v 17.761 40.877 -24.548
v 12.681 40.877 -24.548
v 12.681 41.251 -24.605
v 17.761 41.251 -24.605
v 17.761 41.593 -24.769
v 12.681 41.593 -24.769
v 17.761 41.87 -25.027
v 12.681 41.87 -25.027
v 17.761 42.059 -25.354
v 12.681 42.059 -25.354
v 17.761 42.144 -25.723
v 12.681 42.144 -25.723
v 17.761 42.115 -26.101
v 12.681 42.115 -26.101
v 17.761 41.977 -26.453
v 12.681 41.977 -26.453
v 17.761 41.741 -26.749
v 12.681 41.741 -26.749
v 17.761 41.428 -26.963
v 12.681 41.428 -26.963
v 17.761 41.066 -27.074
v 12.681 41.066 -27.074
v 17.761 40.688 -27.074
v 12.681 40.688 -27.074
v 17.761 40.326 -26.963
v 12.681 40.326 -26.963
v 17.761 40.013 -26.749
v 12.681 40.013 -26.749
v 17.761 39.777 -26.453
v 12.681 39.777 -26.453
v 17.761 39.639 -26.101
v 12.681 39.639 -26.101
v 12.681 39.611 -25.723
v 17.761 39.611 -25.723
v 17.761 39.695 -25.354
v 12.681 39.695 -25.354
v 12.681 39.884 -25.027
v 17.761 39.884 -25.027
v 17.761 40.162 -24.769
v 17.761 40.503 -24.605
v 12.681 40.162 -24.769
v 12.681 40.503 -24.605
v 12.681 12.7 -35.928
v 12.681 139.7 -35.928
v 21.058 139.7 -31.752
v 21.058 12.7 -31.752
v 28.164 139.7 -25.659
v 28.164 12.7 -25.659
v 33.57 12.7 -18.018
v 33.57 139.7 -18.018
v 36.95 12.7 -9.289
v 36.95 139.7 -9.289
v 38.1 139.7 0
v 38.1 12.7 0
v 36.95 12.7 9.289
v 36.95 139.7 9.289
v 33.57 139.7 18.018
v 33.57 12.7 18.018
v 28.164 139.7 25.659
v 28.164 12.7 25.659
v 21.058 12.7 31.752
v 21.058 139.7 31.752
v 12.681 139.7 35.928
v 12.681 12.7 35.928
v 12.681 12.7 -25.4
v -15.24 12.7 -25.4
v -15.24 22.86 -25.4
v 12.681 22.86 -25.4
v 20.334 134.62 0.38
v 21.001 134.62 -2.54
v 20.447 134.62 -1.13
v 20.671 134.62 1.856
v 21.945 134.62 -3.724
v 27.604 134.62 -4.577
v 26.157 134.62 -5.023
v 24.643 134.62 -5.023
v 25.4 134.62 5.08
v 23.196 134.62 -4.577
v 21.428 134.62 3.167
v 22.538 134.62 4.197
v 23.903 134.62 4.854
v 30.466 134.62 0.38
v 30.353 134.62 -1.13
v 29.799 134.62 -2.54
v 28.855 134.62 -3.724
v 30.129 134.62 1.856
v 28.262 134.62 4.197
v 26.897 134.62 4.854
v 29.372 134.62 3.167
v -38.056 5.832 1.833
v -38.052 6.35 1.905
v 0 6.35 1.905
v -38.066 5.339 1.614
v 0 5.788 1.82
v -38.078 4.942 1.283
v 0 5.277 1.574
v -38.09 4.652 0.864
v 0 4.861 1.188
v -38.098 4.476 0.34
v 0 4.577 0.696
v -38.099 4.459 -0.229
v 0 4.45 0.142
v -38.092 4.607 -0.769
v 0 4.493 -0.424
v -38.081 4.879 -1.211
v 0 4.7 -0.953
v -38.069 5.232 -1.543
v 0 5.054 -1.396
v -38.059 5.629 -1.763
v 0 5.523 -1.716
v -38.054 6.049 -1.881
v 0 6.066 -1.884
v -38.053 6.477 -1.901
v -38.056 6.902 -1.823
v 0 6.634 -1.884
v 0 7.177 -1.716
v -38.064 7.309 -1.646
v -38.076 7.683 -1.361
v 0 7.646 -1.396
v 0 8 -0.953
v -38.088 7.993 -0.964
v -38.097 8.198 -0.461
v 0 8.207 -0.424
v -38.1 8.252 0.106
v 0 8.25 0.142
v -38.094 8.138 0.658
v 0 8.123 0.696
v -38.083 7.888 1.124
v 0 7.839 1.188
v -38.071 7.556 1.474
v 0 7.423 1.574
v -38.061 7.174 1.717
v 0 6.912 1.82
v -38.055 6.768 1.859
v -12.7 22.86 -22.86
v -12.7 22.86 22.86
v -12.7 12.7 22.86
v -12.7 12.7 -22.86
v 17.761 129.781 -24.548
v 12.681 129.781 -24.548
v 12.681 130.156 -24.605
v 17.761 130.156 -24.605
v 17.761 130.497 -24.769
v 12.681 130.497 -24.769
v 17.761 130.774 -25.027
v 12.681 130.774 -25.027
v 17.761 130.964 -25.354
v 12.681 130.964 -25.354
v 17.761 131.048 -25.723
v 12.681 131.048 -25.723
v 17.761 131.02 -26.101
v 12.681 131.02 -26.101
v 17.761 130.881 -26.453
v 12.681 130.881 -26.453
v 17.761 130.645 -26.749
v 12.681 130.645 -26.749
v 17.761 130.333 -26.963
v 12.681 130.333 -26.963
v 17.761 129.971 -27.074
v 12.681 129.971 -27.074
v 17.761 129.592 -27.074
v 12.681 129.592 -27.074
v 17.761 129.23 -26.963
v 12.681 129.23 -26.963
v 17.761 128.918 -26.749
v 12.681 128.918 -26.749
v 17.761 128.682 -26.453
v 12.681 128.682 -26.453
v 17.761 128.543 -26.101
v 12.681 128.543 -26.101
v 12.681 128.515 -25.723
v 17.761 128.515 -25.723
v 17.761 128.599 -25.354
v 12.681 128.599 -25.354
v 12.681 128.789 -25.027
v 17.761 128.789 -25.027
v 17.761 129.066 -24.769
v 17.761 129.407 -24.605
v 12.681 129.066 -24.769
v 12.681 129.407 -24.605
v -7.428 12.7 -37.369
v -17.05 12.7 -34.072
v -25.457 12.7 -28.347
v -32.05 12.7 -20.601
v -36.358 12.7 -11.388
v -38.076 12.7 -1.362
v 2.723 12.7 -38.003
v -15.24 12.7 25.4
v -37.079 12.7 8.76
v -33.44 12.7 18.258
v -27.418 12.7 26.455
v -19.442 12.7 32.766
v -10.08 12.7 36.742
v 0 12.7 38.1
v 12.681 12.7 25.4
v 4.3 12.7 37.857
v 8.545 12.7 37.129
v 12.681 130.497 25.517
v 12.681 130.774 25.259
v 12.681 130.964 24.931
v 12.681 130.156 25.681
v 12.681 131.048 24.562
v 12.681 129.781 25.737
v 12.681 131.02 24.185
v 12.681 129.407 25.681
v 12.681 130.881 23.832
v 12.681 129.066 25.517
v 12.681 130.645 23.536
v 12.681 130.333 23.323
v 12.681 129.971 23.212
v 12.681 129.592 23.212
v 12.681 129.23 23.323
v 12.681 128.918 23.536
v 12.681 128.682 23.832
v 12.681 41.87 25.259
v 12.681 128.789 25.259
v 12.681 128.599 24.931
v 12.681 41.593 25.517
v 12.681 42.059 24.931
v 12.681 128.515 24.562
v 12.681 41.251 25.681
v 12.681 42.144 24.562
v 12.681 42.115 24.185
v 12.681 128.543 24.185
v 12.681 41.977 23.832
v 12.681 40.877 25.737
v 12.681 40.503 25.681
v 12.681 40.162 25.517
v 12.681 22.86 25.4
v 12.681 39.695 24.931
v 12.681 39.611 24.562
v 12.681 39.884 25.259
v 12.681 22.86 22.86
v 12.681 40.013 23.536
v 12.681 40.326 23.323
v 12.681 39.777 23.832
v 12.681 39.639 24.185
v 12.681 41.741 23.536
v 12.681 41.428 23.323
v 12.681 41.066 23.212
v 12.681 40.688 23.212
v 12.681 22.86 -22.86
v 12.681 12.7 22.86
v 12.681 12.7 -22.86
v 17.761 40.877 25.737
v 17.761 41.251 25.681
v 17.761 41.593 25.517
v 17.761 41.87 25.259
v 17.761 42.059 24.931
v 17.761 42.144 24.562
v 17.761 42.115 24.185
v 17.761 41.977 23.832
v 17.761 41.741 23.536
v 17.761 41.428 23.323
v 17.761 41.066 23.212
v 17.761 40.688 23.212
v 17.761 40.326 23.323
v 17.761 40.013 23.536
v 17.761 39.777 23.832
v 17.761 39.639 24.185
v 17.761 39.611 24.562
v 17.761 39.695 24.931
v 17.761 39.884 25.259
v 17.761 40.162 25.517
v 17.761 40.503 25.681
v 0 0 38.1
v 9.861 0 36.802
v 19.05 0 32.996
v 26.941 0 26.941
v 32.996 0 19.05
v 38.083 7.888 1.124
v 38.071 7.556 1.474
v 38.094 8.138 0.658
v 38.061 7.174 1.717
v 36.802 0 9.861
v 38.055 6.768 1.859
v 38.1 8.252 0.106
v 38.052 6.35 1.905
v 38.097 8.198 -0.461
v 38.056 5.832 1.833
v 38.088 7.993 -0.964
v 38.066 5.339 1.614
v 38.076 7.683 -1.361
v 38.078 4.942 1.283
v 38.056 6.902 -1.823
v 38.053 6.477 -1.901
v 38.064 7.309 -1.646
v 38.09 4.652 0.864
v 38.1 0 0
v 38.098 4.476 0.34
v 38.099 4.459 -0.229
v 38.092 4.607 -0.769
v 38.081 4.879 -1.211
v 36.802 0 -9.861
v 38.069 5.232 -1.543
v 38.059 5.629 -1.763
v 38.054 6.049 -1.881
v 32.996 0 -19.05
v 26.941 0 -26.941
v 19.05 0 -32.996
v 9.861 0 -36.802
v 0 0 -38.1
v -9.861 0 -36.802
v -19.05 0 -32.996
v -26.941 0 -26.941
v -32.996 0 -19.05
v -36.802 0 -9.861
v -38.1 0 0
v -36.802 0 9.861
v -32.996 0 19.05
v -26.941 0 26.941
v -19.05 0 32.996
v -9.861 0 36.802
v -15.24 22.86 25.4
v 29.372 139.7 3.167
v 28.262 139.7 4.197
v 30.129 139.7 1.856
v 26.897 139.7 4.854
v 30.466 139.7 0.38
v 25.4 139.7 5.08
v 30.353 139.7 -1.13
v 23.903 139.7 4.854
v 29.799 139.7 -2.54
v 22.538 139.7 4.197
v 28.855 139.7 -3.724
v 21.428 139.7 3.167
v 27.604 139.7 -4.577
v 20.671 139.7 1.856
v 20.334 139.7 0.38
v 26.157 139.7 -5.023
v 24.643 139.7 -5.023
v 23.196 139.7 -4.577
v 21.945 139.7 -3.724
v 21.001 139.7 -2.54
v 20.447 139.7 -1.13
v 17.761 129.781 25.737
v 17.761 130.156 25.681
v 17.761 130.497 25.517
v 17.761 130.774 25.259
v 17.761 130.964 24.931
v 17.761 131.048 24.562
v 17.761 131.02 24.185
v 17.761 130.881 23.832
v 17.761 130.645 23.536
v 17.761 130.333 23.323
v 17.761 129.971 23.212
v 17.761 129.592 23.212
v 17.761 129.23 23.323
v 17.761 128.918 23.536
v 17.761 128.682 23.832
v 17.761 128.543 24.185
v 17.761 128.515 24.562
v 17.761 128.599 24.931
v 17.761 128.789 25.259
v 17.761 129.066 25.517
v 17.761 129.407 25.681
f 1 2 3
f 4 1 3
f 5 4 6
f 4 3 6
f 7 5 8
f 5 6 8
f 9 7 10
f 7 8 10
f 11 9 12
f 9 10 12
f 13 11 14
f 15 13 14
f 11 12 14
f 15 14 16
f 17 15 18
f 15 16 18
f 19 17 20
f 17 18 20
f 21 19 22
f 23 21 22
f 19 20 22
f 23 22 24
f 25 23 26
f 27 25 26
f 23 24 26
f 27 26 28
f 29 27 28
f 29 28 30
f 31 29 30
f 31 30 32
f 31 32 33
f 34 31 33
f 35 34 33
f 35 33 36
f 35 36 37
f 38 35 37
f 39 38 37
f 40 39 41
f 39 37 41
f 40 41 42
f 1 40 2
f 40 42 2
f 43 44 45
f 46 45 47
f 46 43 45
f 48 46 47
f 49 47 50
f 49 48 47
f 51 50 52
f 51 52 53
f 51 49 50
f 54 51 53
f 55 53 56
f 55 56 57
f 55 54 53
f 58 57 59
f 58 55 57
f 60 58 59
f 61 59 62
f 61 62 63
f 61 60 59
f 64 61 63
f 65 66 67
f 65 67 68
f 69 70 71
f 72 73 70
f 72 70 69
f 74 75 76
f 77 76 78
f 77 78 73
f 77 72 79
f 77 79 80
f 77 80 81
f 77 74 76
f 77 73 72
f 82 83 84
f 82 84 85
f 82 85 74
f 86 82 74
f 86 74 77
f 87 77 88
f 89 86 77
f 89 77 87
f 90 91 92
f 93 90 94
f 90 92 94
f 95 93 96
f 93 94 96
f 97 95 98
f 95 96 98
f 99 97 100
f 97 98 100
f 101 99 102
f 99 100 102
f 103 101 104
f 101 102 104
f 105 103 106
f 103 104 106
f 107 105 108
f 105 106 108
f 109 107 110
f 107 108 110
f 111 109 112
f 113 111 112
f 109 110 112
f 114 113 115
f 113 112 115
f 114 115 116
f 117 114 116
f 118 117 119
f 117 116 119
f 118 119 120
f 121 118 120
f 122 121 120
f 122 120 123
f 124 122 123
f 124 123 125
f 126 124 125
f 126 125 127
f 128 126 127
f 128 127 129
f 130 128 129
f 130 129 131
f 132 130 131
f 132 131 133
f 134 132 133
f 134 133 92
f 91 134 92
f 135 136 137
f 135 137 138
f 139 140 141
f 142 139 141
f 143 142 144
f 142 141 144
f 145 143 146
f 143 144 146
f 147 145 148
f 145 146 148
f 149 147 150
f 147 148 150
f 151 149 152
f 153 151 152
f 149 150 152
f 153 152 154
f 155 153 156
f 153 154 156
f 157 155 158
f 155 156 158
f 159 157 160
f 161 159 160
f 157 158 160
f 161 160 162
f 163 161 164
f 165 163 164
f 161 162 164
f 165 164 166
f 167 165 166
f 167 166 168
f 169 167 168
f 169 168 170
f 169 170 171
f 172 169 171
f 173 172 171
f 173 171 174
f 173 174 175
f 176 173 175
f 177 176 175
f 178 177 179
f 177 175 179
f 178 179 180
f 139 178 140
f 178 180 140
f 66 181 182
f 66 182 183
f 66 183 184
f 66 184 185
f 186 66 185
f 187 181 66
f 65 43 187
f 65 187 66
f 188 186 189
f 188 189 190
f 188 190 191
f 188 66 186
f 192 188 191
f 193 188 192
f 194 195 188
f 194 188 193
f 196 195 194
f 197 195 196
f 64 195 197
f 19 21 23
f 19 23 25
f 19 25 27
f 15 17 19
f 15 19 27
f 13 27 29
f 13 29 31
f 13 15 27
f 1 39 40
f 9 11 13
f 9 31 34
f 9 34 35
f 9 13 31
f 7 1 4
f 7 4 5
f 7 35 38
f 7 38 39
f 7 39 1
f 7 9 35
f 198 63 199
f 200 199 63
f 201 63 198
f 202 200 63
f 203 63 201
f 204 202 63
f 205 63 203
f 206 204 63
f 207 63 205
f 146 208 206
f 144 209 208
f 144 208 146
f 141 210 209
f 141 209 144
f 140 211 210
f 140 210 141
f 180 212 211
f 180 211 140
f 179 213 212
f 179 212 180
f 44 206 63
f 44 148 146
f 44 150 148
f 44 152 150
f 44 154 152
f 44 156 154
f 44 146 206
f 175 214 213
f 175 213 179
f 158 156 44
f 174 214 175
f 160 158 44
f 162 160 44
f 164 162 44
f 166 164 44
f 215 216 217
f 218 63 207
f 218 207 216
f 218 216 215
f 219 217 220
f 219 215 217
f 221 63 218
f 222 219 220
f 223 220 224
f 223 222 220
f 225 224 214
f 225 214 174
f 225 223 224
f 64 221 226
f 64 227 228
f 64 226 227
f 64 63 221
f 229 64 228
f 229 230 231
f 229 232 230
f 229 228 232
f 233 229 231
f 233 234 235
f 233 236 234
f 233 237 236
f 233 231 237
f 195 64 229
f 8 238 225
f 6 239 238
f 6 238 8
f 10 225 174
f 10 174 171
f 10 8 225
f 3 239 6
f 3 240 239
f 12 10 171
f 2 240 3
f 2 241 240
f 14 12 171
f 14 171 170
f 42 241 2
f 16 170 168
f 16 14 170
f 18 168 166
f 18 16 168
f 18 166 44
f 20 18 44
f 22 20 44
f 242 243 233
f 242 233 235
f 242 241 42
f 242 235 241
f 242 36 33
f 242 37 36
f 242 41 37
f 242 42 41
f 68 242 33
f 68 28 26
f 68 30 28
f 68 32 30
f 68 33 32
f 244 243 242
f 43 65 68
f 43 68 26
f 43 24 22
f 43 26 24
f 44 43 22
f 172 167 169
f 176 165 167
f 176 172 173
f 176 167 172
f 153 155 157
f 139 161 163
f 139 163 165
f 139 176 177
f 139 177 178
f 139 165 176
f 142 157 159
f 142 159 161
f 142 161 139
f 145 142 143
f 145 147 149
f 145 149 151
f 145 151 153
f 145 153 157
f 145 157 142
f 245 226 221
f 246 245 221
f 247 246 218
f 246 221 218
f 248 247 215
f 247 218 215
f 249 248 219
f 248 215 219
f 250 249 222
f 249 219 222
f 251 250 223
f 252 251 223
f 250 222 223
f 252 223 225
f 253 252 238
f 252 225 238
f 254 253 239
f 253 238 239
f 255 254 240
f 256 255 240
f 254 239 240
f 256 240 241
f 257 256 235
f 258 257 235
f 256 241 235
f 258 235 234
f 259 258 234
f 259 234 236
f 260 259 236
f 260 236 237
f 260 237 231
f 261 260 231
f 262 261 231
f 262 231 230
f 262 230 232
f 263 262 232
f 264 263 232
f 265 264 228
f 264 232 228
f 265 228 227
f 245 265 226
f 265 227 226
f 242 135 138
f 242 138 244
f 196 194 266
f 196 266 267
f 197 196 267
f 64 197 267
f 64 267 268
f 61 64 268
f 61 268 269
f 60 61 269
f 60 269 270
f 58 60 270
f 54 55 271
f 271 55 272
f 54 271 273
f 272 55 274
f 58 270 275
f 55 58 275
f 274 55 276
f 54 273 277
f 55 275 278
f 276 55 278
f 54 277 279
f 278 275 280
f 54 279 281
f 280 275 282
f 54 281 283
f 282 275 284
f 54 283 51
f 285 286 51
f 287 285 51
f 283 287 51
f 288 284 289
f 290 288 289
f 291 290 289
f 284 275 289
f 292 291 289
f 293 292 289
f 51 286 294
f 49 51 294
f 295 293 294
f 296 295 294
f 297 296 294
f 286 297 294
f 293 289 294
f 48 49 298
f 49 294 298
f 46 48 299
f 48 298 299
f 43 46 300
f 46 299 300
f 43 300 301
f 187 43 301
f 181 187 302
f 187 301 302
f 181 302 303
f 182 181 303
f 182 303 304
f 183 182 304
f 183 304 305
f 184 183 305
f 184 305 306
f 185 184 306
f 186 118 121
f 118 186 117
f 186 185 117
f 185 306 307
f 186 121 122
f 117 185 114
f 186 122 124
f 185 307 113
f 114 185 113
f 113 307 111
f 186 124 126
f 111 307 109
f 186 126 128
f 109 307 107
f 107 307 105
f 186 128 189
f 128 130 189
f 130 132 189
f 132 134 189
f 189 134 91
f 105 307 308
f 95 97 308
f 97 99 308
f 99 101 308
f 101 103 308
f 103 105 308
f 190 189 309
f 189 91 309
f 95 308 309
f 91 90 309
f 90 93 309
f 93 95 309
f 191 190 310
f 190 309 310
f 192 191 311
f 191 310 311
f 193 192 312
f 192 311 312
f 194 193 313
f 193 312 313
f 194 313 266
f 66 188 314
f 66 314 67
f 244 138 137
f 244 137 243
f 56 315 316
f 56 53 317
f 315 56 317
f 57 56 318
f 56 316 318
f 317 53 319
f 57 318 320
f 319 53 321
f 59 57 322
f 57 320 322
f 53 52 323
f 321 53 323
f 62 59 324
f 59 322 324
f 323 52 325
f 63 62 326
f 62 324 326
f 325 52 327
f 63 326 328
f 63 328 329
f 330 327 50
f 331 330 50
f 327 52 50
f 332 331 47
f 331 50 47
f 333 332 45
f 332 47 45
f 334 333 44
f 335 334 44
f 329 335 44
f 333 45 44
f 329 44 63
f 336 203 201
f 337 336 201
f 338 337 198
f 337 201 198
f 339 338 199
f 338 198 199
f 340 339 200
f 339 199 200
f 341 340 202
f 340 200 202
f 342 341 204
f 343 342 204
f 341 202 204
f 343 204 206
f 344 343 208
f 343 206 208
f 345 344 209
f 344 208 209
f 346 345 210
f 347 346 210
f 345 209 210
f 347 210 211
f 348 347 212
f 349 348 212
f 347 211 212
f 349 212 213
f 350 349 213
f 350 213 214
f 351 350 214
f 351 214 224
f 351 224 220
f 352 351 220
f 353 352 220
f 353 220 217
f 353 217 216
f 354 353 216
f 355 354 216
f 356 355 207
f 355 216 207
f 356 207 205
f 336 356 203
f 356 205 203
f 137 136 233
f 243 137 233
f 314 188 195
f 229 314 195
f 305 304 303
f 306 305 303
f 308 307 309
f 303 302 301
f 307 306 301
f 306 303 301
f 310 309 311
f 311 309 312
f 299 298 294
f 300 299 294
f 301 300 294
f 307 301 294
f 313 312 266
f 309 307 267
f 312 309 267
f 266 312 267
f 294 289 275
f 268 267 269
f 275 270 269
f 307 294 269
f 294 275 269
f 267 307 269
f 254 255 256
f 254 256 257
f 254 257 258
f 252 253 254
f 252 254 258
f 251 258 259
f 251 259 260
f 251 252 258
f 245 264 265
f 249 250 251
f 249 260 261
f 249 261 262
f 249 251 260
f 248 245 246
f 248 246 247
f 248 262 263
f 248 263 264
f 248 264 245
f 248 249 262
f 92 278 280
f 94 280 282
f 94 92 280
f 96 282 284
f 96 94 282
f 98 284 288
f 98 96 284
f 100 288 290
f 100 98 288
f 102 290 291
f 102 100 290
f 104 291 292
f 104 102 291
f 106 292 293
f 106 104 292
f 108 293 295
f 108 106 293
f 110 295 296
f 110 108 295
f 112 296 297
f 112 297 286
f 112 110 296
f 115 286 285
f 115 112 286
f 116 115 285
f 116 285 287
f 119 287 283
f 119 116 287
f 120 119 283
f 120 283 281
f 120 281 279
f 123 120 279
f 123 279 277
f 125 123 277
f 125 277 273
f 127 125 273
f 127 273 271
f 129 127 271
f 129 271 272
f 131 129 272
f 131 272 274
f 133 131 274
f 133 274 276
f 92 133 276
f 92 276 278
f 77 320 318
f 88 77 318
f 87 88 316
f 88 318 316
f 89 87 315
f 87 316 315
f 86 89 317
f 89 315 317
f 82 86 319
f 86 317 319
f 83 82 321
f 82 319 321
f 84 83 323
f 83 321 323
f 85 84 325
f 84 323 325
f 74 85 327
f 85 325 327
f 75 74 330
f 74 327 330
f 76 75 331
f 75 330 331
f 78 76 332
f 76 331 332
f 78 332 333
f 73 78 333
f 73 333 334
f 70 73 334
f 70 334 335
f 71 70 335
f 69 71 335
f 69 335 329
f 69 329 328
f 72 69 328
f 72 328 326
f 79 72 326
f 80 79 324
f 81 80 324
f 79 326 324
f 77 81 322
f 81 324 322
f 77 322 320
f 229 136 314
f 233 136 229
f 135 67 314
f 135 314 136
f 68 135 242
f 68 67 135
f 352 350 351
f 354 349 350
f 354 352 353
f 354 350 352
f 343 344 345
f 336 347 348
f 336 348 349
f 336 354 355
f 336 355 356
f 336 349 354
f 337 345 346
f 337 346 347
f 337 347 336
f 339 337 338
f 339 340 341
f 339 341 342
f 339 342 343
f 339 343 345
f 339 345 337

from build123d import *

# Parameters (mm, degrees)
SKETCH1_R               = 38.1
BOSS_EXTRUDE1_DEPTH     = 12.7
SKETCH2_W               = 30.48
SKETCH2_H               = 50.8
BOSS_EXTRUDE2_DEPTH     = 10.16
SKETCH3_W               = 25.4
SKETCH3_H               = 45.72
CUT_EXTRUDE1_DEPTH      = 10.16
BOSS_EXTRUDE3_DEPTH     = 127
SKETCH5_R               = 1.27
CUT_EXTRUDE2_DEPTH      = 5.08
SKETCH6_R               = 5.08
CUT_EXTRUDE3_DEPTH      = 5.08
SKETCH7_R               = 1.905
CUT_EXTRUDE4_DEPTH      = 57.658
CUT_EXTRUDE4_DEPTH_BACK = 54.61


with BuildPart() as part:
    # Sketch1 → Boss-Extrude1 (new body)
    with BuildSketch(Plane(origin=(0, 0, 0), x_dir=(1, 0, 0), z_dir=(0, 1, 0))):
        with Locations(Location((0, 0, 0), (0, 0, 270))):
            Circle(SKETCH1_R)
    extrude(amount=BOSS_EXTRUDE1_DEPTH)

    # Sketch2 → Boss-Extrude2 (add)
    with BuildSketch(Plane(origin=(0, 12.7, 0), x_dir=(1, 0, 0), z_dir=(0, 1, 0))):
        Rectangle(SKETCH2_W, SKETCH2_H)
    extrude(amount=BOSS_EXTRUDE2_DEPTH)

    # Sketch3 → Cut-Extrude1 (cut)
    with BuildSketch(Plane(origin=(0, 22.86, 0), x_dir=(1, 0, 0), z_dir=(0, 1, 0))):
        Rectangle(SKETCH3_W, SKETCH3_H)
    extrude(amount=-CUT_EXTRUDE1_DEPTH, mode=Mode.SUBTRACT)

    # Sketch4 → Boss-Extrude3 (add)
    with BuildSketch(Plane(origin=(0, 12.7, 0), x_dir=(1, 0, 0), z_dir=(0, 1, 0))):
        with BuildLine():
            Line((12.680636812, 25.4), (12.680636812, 35.927864535))
            ThreePointArc((12.680636812, 35.927864535), (38.1, 0), (12.680636812, -35.927864535))
            Line((12.680636812, -35.927864535), (12.680636812, 25.4))
        make_face()
    extrude(amount=BOSS_EXTRUDE3_DEPTH)

    # Sketch5 → Cut-Extrude2 (cut)
    with BuildSketch(Plane.ZY.offset(-12.680636812)):
        with Locations((-25.818357005, 129.781486407)):
            Circle(SKETCH5_R)
        with Locations((24.467398365, 129.781486407)):
            Circle(SKETCH5_R)
        with Locations((-25.818357005, 40.877093478)):
            Circle(SKETCH5_R)
        with Locations((24.467398365, 40.877093478)):
            Circle(SKETCH5_R)
    extrude(amount=-CUT_EXTRUDE2_DEPTH, mode=Mode.SUBTRACT)

    # Sketch6 → Cut-Extrude3 (cut)
    with BuildSketch(Plane(origin=(0, 139.7, 0), x_dir=(1, 0, 0), z_dir=(0, 1, 0))):
        with Locations(Location((25.4, 0, 0), (0, 0, 270))):
            Circle(SKETCH6_R)
    extrude(amount=-CUT_EXTRUDE3_DEPTH, mode=Mode.SUBTRACT)

    # Sketch7 → Cut-Extrude4 (cut, two sides)
    with BuildSketch(Plane(origin=(0, 0, 0), x_dir=(0, 0, -1), z_dir=(1, 0, 0))) as cut_extrude4_sk:
        with Locations(Location((0, 6.35, 0), (0, 0, 180))):
            Circle(SKETCH7_R)
    extrude(amount=CUT_EXTRUDE4_DEPTH, mode=Mode.SUBTRACT)
    extrude(cut_extrude4_sk.sketch, amount=-CUT_EXTRUDE4_DEPTH_BACK, mode=Mode.SUBTRACT)


solid = part.part
